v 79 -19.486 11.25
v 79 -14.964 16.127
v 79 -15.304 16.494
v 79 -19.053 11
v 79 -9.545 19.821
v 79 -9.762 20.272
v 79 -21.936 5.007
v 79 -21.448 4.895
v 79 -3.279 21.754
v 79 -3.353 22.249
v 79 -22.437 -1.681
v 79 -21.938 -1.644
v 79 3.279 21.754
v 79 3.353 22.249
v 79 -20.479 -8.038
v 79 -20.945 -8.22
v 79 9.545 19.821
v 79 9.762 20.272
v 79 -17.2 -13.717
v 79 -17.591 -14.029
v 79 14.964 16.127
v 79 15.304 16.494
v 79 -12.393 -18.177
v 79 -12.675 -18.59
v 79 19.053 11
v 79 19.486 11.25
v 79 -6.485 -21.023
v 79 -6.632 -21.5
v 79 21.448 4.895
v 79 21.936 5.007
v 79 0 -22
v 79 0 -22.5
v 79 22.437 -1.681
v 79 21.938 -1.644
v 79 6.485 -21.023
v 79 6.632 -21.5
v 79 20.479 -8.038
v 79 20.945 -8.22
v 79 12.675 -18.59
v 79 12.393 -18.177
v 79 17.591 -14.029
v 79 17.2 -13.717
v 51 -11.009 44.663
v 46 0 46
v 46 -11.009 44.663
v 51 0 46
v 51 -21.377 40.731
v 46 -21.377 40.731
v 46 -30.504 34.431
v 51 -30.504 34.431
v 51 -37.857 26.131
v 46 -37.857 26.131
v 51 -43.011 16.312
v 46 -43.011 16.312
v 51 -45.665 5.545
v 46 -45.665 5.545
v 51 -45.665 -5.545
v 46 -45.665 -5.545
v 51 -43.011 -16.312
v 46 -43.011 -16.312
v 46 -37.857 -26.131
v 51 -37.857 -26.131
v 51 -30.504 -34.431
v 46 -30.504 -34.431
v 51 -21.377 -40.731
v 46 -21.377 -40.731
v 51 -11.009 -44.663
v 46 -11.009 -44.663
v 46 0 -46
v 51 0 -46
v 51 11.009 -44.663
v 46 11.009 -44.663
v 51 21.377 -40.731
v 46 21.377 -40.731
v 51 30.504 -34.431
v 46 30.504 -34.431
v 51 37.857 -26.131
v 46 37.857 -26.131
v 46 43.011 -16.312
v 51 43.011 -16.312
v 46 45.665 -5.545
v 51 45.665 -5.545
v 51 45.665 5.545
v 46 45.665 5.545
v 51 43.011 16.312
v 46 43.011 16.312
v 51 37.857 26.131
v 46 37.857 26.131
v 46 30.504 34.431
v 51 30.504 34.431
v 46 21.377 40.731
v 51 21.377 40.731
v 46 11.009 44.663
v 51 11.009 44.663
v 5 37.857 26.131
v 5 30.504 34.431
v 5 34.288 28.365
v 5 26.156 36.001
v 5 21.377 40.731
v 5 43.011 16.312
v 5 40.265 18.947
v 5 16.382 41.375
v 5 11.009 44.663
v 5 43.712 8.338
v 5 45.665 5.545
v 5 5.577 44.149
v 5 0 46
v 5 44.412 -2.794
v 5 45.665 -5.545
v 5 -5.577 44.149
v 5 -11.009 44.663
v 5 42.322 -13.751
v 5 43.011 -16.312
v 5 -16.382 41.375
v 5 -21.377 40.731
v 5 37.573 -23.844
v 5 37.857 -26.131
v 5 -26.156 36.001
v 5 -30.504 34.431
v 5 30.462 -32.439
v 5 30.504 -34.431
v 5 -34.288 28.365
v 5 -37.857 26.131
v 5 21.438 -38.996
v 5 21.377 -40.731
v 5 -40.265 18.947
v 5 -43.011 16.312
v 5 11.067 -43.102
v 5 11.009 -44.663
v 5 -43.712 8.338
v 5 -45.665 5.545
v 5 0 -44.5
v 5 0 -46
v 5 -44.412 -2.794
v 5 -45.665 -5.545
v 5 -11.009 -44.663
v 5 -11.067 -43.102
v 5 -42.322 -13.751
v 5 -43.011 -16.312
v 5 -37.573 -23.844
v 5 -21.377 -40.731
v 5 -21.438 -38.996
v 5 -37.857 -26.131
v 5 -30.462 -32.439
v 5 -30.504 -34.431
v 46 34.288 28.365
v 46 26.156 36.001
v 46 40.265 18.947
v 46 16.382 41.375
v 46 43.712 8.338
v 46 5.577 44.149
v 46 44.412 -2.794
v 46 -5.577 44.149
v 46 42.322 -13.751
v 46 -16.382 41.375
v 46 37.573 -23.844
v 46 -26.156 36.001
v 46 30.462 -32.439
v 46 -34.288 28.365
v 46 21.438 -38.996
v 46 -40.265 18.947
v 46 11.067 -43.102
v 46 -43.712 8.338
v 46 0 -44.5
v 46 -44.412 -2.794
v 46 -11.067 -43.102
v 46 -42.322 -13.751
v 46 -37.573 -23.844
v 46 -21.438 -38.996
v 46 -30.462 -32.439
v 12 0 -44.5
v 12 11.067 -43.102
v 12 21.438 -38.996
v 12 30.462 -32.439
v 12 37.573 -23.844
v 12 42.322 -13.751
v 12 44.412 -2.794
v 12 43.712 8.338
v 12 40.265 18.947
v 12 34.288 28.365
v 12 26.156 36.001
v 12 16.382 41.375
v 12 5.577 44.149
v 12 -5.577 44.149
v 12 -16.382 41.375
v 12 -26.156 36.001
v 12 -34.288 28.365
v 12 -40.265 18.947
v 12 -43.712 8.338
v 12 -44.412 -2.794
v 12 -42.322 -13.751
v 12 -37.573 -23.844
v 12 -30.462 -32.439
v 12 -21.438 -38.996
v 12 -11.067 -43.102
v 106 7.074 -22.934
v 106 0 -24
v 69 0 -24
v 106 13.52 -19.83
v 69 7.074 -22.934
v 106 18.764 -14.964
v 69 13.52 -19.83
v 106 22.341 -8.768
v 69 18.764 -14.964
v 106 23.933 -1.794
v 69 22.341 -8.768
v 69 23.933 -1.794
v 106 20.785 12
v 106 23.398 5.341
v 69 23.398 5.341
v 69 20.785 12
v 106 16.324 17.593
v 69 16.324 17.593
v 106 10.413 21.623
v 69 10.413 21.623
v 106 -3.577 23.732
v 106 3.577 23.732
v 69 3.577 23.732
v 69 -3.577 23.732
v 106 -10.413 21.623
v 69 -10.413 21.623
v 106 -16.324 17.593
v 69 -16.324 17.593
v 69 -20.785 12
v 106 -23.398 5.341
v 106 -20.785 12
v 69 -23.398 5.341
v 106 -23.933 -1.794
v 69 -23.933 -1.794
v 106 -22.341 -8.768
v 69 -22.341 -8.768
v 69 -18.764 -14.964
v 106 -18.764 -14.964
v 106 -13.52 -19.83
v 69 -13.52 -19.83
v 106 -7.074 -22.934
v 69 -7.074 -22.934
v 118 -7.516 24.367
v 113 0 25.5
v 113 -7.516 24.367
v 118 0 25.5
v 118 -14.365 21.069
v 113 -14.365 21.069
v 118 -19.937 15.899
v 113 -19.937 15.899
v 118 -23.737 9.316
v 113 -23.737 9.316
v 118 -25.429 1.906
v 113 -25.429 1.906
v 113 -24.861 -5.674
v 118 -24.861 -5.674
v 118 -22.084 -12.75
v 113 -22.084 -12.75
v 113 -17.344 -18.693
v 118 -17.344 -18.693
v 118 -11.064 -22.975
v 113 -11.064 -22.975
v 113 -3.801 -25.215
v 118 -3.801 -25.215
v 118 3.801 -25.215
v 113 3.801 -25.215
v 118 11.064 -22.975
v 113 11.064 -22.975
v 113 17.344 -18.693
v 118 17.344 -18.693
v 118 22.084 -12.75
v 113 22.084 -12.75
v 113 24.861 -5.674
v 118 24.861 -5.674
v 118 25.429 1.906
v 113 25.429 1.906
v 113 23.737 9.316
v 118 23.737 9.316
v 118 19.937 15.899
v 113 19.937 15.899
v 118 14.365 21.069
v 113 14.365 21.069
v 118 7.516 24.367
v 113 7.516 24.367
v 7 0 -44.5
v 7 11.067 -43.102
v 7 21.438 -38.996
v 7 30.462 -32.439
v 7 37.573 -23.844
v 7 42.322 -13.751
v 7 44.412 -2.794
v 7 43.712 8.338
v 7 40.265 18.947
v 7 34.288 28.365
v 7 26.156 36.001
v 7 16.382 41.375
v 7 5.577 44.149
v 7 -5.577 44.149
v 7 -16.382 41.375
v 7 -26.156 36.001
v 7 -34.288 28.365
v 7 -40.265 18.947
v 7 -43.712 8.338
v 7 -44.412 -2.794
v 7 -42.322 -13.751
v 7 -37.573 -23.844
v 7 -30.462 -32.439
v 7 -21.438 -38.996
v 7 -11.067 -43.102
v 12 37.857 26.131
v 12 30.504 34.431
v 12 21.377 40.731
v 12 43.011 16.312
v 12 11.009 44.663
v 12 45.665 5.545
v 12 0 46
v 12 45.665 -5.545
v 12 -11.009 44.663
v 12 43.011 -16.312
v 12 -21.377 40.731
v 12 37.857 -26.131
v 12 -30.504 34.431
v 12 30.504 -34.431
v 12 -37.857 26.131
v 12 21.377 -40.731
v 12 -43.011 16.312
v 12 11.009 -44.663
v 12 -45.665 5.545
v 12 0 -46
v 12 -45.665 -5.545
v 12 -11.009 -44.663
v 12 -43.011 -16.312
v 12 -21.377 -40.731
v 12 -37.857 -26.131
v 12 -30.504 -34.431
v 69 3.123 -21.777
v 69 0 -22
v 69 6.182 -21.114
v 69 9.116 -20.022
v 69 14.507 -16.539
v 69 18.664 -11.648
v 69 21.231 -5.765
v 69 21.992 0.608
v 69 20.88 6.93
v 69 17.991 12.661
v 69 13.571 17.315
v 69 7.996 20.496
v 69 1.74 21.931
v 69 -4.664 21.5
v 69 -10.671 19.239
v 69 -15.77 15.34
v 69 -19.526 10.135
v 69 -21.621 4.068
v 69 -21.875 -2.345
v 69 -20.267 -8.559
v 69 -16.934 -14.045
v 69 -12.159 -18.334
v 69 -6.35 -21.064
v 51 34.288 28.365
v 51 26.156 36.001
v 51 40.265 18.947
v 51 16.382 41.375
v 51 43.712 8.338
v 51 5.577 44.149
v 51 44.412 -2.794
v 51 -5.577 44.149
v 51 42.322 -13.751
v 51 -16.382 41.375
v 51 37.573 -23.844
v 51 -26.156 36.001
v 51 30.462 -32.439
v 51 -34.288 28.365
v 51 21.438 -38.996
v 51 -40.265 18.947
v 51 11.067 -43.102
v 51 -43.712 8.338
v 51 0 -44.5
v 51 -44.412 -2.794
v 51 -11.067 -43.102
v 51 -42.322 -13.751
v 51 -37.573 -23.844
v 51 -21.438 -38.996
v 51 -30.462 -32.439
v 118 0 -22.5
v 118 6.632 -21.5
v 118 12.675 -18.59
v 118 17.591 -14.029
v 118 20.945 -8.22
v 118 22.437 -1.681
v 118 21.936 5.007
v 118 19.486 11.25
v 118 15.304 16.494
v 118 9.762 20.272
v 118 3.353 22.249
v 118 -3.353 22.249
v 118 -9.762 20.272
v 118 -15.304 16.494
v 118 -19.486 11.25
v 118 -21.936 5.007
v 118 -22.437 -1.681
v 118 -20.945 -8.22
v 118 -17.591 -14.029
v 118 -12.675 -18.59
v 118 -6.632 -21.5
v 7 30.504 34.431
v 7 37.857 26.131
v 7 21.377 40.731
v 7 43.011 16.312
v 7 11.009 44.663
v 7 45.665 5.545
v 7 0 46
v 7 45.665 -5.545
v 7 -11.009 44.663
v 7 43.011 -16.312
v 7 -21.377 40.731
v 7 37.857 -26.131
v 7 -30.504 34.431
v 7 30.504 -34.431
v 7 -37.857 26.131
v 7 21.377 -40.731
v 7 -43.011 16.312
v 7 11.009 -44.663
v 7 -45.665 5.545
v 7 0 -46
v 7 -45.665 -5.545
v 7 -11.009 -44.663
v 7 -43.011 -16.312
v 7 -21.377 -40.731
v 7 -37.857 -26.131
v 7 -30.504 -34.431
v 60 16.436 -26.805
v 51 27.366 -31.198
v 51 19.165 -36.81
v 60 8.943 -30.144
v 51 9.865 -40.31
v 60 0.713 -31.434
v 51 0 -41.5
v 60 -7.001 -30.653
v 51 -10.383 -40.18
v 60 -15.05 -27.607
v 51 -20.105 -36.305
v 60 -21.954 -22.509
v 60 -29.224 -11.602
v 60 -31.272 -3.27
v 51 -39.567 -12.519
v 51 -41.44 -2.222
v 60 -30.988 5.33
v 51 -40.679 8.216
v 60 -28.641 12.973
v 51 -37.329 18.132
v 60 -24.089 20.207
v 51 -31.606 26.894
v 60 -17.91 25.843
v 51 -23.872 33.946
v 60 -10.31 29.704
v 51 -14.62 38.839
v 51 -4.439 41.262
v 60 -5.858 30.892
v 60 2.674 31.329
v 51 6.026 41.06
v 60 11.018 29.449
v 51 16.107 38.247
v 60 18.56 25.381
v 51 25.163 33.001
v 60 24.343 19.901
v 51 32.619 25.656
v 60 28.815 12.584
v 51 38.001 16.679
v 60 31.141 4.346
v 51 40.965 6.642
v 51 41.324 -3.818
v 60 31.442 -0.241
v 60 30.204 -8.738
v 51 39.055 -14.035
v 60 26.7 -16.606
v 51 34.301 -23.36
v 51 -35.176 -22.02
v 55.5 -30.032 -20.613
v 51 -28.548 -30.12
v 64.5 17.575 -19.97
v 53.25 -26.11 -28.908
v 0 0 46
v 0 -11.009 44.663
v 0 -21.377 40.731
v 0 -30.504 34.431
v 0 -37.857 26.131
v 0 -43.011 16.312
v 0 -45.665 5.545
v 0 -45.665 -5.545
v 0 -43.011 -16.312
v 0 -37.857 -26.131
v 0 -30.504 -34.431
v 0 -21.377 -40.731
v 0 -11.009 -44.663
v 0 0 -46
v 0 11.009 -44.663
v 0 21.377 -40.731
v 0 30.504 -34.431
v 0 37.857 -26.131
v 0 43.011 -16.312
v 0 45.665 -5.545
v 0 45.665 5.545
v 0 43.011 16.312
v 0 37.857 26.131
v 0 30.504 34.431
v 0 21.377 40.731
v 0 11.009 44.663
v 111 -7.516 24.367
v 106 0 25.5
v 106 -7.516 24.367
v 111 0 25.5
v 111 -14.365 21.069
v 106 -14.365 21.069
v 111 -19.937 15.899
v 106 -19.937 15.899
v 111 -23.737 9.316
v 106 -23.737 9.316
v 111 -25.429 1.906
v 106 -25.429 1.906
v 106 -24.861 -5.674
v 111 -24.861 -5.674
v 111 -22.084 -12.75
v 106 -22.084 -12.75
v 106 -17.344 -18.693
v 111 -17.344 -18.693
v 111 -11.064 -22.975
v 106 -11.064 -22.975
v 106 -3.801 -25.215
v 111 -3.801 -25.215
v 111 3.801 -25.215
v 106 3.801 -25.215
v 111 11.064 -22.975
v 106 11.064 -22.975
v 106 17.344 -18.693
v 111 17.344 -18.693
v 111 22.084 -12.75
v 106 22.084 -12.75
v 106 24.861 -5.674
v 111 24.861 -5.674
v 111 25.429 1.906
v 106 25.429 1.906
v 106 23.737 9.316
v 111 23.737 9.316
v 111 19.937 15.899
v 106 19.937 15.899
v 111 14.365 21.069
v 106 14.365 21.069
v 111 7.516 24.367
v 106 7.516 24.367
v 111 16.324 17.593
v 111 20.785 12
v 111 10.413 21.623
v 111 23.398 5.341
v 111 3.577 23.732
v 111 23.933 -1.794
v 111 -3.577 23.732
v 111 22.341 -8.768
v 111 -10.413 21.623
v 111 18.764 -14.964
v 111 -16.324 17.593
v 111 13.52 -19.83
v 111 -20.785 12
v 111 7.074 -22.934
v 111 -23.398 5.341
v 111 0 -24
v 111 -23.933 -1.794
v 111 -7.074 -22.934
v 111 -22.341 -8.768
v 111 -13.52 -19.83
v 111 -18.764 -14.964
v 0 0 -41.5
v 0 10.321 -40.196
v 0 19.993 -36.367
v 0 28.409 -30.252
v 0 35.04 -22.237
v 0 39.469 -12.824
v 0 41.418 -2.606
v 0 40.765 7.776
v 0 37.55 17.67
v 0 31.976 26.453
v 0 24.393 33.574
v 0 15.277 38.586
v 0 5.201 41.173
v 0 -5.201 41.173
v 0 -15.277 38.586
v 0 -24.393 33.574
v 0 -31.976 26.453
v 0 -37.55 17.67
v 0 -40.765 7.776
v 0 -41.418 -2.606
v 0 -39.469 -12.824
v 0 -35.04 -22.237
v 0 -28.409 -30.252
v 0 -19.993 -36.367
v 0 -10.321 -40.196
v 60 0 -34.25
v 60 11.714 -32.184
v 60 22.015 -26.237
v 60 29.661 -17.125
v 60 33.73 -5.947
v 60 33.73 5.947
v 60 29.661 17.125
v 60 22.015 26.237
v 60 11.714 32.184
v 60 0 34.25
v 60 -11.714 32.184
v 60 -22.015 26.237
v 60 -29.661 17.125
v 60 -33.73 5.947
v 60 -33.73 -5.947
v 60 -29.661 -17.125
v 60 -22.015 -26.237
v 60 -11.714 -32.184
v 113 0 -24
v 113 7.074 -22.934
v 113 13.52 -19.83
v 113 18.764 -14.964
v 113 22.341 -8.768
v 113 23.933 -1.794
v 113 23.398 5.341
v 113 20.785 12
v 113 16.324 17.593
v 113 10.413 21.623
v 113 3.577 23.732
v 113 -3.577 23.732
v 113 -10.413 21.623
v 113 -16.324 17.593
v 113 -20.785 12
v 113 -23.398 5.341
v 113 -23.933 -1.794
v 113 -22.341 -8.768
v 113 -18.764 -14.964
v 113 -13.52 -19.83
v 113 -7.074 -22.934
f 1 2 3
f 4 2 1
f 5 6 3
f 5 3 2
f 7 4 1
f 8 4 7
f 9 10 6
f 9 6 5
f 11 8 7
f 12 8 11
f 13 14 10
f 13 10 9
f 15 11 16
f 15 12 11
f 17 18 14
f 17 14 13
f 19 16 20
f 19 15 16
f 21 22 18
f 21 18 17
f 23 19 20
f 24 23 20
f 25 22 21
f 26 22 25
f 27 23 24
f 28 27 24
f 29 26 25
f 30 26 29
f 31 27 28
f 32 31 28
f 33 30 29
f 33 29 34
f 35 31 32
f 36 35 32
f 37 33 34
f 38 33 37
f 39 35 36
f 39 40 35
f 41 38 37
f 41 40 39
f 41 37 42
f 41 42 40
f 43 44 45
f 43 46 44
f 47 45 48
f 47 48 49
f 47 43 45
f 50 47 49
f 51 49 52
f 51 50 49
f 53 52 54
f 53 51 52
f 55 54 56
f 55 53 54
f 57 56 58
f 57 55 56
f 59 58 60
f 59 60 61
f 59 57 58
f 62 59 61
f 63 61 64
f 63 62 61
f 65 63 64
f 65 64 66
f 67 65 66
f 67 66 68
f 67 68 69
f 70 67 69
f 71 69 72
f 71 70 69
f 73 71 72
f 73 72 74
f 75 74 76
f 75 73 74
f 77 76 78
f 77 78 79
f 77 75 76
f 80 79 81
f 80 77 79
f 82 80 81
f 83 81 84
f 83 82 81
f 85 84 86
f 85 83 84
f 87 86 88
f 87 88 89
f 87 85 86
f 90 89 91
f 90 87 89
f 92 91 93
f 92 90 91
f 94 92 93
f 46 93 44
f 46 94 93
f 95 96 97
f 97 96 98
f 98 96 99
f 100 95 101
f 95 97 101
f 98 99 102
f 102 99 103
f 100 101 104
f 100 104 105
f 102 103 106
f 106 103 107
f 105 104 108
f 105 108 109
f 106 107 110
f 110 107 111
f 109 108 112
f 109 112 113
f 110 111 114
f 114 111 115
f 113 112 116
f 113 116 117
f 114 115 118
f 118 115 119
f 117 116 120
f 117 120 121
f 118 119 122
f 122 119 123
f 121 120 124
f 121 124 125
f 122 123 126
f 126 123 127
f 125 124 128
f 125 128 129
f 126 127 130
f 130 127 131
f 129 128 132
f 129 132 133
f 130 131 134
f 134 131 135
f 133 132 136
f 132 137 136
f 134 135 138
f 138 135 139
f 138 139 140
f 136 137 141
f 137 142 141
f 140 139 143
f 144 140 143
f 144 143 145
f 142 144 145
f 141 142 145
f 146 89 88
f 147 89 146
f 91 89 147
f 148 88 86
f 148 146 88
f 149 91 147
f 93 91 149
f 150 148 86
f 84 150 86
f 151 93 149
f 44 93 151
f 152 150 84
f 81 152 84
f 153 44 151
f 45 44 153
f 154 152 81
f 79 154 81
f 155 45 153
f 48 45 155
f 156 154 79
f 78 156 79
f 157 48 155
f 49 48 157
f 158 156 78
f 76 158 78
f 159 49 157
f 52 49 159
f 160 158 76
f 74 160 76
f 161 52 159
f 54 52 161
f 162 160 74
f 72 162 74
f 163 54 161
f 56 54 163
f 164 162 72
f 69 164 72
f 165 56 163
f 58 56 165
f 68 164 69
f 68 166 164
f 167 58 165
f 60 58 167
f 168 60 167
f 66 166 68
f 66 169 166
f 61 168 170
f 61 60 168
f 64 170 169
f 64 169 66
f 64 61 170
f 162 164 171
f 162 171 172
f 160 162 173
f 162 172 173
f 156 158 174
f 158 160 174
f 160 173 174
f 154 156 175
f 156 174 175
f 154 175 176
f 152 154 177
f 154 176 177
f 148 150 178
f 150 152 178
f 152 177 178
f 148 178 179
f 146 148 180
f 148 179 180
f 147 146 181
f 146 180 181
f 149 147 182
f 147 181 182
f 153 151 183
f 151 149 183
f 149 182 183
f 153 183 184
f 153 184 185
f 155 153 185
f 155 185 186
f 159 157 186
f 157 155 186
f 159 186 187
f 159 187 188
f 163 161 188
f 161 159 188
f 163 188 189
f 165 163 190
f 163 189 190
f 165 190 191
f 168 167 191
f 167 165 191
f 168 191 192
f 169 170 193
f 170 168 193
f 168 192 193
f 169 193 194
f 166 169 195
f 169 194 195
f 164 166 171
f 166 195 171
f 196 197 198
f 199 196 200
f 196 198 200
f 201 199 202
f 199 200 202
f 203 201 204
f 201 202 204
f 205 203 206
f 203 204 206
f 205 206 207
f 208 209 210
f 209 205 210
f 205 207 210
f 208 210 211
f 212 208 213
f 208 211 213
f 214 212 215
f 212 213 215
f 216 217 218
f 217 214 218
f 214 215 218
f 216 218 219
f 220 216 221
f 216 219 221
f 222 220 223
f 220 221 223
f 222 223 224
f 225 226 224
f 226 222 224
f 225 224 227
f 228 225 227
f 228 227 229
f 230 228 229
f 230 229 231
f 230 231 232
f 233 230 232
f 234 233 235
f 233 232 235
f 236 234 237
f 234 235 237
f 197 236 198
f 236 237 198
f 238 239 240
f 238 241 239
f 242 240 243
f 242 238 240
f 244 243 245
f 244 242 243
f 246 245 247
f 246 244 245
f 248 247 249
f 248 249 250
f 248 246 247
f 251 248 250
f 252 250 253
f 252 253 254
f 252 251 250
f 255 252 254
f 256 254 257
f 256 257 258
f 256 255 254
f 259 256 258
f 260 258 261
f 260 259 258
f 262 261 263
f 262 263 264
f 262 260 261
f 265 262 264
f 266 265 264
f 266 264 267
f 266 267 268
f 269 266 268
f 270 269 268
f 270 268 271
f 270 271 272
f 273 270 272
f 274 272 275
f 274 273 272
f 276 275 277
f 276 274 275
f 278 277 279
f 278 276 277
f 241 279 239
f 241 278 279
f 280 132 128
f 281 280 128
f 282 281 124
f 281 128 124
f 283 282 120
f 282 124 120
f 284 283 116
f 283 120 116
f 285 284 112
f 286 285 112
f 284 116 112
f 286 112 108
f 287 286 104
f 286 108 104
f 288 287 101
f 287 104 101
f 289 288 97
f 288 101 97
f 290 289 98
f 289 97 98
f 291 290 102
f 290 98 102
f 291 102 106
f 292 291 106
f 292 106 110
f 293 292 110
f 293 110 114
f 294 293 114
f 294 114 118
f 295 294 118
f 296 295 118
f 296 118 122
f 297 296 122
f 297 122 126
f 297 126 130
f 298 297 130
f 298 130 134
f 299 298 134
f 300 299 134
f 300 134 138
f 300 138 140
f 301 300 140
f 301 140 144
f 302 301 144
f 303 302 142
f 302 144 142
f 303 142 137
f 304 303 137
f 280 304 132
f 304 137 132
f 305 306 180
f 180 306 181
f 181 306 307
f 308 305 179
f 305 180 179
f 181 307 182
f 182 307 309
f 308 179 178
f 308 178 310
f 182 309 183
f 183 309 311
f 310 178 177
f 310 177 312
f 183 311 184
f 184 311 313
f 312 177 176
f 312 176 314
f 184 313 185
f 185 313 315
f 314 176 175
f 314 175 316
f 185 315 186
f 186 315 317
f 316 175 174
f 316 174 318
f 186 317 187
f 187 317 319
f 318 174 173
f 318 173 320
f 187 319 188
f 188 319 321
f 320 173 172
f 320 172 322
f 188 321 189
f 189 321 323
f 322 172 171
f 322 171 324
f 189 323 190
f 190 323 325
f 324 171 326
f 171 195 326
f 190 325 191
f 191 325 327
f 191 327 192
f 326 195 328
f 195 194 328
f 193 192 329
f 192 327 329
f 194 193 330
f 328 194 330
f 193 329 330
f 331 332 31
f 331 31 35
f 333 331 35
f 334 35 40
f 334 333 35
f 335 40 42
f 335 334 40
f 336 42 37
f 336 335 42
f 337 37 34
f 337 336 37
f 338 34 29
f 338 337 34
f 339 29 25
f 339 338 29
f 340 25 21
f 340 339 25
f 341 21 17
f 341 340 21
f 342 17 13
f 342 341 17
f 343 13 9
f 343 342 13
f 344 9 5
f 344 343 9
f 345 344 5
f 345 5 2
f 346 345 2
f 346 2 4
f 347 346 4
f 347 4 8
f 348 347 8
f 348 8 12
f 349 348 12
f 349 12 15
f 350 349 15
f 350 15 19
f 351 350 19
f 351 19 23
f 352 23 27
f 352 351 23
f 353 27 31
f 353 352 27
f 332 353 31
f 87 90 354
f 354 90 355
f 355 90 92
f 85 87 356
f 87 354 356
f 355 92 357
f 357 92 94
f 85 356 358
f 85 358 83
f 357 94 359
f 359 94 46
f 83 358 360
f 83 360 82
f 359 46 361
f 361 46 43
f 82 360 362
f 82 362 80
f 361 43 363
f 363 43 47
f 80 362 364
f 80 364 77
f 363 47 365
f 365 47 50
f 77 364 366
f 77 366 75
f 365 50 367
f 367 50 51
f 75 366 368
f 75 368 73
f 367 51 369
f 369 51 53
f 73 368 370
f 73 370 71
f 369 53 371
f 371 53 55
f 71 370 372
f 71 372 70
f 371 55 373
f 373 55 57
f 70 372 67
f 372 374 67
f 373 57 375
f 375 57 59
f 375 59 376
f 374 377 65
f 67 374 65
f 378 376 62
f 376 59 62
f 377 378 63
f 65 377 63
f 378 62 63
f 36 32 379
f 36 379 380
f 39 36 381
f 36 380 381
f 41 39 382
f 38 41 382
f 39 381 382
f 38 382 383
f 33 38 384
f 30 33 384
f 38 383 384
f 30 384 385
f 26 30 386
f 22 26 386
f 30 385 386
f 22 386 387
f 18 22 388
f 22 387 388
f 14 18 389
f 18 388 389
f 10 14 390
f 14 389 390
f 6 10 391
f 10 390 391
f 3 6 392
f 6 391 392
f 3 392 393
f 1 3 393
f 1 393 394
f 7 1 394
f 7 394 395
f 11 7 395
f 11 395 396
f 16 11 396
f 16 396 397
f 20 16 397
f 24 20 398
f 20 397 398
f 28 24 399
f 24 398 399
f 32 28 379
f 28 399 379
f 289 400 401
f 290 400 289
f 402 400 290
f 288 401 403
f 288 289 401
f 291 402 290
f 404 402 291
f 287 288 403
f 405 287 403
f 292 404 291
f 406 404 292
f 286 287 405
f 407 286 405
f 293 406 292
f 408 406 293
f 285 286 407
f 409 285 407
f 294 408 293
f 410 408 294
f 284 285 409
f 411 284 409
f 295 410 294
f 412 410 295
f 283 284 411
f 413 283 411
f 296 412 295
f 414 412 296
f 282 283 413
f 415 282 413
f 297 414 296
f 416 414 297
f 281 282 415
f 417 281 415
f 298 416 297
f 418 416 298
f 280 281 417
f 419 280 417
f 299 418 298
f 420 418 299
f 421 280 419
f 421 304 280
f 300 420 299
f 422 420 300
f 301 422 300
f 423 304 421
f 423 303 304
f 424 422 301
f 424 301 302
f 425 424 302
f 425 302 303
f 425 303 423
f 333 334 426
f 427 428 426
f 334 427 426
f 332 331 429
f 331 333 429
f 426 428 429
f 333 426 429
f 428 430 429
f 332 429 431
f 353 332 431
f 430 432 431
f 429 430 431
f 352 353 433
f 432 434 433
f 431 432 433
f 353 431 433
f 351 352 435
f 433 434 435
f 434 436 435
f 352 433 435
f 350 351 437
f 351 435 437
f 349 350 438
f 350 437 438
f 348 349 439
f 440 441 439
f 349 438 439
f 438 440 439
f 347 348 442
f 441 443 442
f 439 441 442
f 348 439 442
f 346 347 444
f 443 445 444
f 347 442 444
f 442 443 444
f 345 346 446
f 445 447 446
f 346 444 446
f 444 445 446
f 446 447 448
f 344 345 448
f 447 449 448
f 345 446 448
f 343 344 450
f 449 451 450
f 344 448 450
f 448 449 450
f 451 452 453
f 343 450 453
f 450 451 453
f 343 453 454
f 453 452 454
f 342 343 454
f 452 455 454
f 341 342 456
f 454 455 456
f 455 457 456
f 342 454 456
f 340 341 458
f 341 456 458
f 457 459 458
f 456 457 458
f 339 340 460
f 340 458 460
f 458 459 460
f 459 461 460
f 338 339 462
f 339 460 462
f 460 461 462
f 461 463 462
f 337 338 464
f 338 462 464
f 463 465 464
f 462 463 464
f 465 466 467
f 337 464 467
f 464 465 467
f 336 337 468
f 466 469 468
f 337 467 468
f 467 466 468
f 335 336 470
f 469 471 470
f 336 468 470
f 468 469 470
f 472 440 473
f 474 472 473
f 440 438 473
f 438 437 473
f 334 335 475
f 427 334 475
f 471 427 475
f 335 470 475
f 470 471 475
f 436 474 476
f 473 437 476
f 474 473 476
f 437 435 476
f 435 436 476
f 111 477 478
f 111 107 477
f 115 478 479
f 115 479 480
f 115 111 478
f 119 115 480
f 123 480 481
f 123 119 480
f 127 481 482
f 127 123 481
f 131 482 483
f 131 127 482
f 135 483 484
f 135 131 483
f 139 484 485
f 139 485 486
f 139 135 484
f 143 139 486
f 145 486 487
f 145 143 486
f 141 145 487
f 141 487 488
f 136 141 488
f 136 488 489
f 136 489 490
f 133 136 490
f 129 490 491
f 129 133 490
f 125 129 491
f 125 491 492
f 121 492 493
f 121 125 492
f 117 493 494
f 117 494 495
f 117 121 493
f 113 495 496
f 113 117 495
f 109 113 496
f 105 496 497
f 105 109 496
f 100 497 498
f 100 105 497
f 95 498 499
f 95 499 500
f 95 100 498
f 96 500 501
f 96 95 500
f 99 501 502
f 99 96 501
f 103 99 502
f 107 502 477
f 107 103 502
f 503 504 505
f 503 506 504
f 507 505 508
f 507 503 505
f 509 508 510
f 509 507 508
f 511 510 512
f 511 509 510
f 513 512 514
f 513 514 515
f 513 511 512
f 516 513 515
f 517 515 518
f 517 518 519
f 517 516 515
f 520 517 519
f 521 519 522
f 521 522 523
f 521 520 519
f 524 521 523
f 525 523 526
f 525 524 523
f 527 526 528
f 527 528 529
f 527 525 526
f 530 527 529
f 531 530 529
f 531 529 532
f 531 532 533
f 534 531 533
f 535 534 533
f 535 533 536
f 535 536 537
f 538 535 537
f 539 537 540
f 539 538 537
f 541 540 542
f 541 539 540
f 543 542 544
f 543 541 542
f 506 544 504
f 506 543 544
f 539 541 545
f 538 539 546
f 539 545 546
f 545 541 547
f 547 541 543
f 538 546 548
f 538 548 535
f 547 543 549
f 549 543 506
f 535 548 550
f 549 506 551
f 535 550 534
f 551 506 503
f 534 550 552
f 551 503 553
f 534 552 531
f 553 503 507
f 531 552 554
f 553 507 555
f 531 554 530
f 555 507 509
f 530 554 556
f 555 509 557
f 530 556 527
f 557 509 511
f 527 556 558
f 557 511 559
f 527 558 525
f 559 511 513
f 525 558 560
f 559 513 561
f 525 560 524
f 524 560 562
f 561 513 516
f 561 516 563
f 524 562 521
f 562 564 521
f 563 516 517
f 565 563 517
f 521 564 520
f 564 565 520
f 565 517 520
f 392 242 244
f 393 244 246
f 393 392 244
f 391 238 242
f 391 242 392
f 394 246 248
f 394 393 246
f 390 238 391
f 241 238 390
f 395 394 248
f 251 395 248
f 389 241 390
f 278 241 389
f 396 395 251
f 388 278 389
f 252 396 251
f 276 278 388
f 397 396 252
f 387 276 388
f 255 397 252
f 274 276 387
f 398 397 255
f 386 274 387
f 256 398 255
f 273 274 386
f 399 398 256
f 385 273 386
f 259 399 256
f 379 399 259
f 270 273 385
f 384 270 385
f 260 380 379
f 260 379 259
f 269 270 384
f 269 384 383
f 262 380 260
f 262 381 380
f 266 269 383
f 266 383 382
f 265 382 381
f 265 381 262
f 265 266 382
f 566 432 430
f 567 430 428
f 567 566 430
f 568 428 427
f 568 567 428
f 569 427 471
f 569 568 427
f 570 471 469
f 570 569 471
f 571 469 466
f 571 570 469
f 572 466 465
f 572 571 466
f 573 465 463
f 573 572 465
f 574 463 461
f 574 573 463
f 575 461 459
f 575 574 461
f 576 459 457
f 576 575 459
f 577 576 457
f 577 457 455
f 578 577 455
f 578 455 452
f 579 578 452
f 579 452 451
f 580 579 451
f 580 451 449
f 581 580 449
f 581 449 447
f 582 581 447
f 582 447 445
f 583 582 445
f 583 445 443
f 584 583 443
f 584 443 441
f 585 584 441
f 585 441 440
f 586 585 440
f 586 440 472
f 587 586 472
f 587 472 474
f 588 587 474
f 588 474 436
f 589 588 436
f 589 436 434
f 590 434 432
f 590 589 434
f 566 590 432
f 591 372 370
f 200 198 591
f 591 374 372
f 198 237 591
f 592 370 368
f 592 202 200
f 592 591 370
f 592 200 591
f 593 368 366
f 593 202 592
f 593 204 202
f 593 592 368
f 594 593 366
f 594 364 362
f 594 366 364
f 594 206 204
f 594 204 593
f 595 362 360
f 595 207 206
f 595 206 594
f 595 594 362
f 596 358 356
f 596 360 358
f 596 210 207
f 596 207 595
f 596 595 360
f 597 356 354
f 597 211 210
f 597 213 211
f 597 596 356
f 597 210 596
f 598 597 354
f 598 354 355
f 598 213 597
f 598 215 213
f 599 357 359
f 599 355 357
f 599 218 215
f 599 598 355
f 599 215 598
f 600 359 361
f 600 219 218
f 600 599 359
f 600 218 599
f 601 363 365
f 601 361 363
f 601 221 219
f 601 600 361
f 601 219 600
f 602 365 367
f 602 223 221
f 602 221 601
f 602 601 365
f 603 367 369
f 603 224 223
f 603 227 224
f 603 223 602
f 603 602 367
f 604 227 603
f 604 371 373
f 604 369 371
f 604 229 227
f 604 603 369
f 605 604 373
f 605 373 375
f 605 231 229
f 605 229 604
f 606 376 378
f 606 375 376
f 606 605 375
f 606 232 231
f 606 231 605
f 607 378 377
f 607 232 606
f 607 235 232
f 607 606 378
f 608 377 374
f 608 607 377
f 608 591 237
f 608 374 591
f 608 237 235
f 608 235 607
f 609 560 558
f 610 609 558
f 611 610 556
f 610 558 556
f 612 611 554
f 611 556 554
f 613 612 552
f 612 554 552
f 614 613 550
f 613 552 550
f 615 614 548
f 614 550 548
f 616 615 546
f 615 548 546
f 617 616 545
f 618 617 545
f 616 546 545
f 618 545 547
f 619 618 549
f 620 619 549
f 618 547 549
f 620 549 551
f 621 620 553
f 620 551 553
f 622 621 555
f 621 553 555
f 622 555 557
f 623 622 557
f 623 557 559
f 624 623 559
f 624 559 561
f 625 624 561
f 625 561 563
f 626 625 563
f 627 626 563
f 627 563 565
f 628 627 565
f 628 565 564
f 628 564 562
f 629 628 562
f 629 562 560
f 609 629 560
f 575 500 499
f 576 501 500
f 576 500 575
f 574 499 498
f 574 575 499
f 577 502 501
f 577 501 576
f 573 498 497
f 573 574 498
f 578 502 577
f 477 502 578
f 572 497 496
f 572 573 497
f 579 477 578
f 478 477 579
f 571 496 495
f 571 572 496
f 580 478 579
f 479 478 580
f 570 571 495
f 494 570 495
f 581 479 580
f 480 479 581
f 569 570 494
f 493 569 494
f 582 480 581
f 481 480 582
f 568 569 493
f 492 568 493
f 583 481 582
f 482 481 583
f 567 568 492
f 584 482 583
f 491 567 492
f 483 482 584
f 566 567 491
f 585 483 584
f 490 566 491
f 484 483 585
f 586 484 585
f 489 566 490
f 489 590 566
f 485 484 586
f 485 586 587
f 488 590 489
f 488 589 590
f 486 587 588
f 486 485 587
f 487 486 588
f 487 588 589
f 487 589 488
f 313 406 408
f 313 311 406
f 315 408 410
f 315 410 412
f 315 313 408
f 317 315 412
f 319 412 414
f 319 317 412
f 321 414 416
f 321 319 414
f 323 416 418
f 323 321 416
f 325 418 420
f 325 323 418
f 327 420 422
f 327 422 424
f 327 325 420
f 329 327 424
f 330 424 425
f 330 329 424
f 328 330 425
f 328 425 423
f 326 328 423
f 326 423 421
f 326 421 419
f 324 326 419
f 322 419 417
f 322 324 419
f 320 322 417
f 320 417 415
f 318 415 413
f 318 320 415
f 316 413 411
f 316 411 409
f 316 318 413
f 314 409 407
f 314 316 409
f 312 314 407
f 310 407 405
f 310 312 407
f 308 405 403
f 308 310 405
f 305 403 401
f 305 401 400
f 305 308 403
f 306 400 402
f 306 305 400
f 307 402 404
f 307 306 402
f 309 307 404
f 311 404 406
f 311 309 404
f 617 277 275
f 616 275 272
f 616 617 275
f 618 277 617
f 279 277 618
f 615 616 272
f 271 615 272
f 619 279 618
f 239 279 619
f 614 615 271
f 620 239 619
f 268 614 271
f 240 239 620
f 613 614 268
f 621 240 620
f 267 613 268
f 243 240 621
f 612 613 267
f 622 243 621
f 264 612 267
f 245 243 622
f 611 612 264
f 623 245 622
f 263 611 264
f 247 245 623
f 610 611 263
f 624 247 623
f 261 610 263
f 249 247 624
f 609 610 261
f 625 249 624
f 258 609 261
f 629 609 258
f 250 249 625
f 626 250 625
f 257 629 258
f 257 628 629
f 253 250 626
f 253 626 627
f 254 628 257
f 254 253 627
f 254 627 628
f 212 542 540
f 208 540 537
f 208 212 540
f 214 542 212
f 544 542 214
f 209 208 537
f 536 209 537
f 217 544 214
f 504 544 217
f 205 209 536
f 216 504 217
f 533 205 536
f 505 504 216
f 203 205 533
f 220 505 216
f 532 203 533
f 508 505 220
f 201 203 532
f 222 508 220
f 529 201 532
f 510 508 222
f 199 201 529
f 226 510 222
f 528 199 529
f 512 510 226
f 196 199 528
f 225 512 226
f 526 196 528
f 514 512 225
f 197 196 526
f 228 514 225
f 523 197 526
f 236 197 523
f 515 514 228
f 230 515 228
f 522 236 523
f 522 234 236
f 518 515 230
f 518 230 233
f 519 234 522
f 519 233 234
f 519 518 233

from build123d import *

# Parameters (mm, degrees)
SKELETON_R          = 44.5
SKELETON_R_2        = 41.5
BOSS_EXTRUDE1_DEPTH = 51
BOSS_EXTRUDE2_START = 69
SKELETON_3_R        = 24
SKELETON_3_R_2      = 22
BOSS_EXTRUDE2_DEPTH = 49
SKETCH4_W           = 5
SKETCH4_H           = 1.5
SKETCH6_R           = 22.5
CUT_EXTRUDE1_DEPTH  = 39


with BuildPart() as part:
    # Skeleton → Boss-Extrude1 (new body)
    with BuildSketch(Plane(origin=(0, 0, 0), x_dir=(0, 0, -1), z_dir=(1, 0, 0))):
        Circle(SKELETON_R)
        Circle(SKELETON_R_2, mode=Mode.SUBTRACT)
    extrude(amount=BOSS_EXTRUDE1_DEPTH)



with BuildPart() as body_2:
    # Skeleton<3> → Boss-Extrude2 (new body)
    with BuildSketch(Plane(origin=(0, 0, 0), x_dir=(0, 0, -1), z_dir=(1, 0, 0)).offset(BOSS_EXTRUDE2_START)):
        Circle(SKELETON_3_R)
        Circle(SKELETON_3_R_2, mode=Mode.SUBTRACT)
    extrude(amount=BOSS_EXTRUDE2_DEPTH)


with BuildPart() as part_1:
    add(part.part)

    add(body_2.part)  # loft1 joins it to this body
    # loft up to a face of the part (loft1)
    loft([Face(Wire([part_1.edges().sort_by_distance((51, 32.43910392, 30.462346214))[0]])), Face(Wire([part_1.edges().sort_by_distance((69, -17.495247058, 16.429130542))[0]]))])

    # Cut-Loft1: read off the stored shape, not the designer's step
    # Cut-Loft1: loft between two sections, ruled curve by curve
    cut_loft1_from = [
        Edge.make_bspline([(69, 9.116262782, -20.022331355), (69, -30.928399928, -38.254856919), (69, -49.160925492, 1.789805791), (69, -9.116262782, 20.022331355), (69, 30.928399928, 38.254856919), (69, 49.160925492, -1.789805791), (69, 9.116262782, -20.022331355)], [0, 0, 0, 0, 0.5, 0.5, 0.5, 1, 1, 1, 1], 3, [1, 0.333333333, 0.333333333, 1, 0.333333333, 0.333333333, 1]),
    ]
    cut_loft1_to = [
        Edge.make_bspline([(51, 27.366118575, -31.198486408), (51, -35.030854242, -85.930723557), (51, -89.763091391, -23.533750741), (51, -27.366118575, 31.198486408), (51, 35.030854242, 85.930723557), (51, 89.763091391, 23.533750741), (51, 27.366118575, -31.198486408)], [0, 0, 0, 0, 0.5, 0.5, 0.5, 1, 1, 1, 1], 3, [1, 0.333333333, 0.333333333, 1, 0.333333333, 0.333333333, 1]),
    ]
    cut_loft1 = Solid(Shell([*[Face.make_surface_from_curves(cut_loft1_from[k], cut_loft1_to[k]) for k in range(1)], Face(Wire(cut_loft1_from)), Face(Wire(cut_loft1_to))]))
    add(cut_loft1, mode=Mode.SUBTRACT)

    # Sketch4 → Revolve1 (revolve)
    with BuildSketch(Plane.XY, mode=Mode.PRIVATE) as revolve1_sk:
        with Locations((9.5, 45.25)):
            Rectangle(SKETCH4_W, SKETCH4_H)
        with Locations((2.5, 45.25)):
            Rectangle(SKETCH4_W, SKETCH4_H)
        with Locations((48.5, 45.25)):
            Rectangle(SKETCH4_W, SKETCH4_H)
        with Locations((108.5, 24.75)):
            Rectangle(SKETCH4_W, SKETCH4_H)
        with Locations((115.5, 24.75)):
            Rectangle(SKETCH4_W, SKETCH4_H)
    revolve(revolve1_sk.sketch.rotate(Axis((0, 0, 0), (1, 0, 0)), 90), axis=Axis((0, 0, 0), (1, 0, 0)))

    # Sketch6 → Cut-Extrude1 (cut)
    with BuildSketch(Plane(origin=(118, 0, 0), x_dir=(0, 0, -1), z_dir=(1, 0, 0))):
        Circle(SKETCH6_R)
    extrude(amount=-CUT_EXTRUDE1_DEPTH, mode=Mode.SUBTRACT)


solid = part_1.part
